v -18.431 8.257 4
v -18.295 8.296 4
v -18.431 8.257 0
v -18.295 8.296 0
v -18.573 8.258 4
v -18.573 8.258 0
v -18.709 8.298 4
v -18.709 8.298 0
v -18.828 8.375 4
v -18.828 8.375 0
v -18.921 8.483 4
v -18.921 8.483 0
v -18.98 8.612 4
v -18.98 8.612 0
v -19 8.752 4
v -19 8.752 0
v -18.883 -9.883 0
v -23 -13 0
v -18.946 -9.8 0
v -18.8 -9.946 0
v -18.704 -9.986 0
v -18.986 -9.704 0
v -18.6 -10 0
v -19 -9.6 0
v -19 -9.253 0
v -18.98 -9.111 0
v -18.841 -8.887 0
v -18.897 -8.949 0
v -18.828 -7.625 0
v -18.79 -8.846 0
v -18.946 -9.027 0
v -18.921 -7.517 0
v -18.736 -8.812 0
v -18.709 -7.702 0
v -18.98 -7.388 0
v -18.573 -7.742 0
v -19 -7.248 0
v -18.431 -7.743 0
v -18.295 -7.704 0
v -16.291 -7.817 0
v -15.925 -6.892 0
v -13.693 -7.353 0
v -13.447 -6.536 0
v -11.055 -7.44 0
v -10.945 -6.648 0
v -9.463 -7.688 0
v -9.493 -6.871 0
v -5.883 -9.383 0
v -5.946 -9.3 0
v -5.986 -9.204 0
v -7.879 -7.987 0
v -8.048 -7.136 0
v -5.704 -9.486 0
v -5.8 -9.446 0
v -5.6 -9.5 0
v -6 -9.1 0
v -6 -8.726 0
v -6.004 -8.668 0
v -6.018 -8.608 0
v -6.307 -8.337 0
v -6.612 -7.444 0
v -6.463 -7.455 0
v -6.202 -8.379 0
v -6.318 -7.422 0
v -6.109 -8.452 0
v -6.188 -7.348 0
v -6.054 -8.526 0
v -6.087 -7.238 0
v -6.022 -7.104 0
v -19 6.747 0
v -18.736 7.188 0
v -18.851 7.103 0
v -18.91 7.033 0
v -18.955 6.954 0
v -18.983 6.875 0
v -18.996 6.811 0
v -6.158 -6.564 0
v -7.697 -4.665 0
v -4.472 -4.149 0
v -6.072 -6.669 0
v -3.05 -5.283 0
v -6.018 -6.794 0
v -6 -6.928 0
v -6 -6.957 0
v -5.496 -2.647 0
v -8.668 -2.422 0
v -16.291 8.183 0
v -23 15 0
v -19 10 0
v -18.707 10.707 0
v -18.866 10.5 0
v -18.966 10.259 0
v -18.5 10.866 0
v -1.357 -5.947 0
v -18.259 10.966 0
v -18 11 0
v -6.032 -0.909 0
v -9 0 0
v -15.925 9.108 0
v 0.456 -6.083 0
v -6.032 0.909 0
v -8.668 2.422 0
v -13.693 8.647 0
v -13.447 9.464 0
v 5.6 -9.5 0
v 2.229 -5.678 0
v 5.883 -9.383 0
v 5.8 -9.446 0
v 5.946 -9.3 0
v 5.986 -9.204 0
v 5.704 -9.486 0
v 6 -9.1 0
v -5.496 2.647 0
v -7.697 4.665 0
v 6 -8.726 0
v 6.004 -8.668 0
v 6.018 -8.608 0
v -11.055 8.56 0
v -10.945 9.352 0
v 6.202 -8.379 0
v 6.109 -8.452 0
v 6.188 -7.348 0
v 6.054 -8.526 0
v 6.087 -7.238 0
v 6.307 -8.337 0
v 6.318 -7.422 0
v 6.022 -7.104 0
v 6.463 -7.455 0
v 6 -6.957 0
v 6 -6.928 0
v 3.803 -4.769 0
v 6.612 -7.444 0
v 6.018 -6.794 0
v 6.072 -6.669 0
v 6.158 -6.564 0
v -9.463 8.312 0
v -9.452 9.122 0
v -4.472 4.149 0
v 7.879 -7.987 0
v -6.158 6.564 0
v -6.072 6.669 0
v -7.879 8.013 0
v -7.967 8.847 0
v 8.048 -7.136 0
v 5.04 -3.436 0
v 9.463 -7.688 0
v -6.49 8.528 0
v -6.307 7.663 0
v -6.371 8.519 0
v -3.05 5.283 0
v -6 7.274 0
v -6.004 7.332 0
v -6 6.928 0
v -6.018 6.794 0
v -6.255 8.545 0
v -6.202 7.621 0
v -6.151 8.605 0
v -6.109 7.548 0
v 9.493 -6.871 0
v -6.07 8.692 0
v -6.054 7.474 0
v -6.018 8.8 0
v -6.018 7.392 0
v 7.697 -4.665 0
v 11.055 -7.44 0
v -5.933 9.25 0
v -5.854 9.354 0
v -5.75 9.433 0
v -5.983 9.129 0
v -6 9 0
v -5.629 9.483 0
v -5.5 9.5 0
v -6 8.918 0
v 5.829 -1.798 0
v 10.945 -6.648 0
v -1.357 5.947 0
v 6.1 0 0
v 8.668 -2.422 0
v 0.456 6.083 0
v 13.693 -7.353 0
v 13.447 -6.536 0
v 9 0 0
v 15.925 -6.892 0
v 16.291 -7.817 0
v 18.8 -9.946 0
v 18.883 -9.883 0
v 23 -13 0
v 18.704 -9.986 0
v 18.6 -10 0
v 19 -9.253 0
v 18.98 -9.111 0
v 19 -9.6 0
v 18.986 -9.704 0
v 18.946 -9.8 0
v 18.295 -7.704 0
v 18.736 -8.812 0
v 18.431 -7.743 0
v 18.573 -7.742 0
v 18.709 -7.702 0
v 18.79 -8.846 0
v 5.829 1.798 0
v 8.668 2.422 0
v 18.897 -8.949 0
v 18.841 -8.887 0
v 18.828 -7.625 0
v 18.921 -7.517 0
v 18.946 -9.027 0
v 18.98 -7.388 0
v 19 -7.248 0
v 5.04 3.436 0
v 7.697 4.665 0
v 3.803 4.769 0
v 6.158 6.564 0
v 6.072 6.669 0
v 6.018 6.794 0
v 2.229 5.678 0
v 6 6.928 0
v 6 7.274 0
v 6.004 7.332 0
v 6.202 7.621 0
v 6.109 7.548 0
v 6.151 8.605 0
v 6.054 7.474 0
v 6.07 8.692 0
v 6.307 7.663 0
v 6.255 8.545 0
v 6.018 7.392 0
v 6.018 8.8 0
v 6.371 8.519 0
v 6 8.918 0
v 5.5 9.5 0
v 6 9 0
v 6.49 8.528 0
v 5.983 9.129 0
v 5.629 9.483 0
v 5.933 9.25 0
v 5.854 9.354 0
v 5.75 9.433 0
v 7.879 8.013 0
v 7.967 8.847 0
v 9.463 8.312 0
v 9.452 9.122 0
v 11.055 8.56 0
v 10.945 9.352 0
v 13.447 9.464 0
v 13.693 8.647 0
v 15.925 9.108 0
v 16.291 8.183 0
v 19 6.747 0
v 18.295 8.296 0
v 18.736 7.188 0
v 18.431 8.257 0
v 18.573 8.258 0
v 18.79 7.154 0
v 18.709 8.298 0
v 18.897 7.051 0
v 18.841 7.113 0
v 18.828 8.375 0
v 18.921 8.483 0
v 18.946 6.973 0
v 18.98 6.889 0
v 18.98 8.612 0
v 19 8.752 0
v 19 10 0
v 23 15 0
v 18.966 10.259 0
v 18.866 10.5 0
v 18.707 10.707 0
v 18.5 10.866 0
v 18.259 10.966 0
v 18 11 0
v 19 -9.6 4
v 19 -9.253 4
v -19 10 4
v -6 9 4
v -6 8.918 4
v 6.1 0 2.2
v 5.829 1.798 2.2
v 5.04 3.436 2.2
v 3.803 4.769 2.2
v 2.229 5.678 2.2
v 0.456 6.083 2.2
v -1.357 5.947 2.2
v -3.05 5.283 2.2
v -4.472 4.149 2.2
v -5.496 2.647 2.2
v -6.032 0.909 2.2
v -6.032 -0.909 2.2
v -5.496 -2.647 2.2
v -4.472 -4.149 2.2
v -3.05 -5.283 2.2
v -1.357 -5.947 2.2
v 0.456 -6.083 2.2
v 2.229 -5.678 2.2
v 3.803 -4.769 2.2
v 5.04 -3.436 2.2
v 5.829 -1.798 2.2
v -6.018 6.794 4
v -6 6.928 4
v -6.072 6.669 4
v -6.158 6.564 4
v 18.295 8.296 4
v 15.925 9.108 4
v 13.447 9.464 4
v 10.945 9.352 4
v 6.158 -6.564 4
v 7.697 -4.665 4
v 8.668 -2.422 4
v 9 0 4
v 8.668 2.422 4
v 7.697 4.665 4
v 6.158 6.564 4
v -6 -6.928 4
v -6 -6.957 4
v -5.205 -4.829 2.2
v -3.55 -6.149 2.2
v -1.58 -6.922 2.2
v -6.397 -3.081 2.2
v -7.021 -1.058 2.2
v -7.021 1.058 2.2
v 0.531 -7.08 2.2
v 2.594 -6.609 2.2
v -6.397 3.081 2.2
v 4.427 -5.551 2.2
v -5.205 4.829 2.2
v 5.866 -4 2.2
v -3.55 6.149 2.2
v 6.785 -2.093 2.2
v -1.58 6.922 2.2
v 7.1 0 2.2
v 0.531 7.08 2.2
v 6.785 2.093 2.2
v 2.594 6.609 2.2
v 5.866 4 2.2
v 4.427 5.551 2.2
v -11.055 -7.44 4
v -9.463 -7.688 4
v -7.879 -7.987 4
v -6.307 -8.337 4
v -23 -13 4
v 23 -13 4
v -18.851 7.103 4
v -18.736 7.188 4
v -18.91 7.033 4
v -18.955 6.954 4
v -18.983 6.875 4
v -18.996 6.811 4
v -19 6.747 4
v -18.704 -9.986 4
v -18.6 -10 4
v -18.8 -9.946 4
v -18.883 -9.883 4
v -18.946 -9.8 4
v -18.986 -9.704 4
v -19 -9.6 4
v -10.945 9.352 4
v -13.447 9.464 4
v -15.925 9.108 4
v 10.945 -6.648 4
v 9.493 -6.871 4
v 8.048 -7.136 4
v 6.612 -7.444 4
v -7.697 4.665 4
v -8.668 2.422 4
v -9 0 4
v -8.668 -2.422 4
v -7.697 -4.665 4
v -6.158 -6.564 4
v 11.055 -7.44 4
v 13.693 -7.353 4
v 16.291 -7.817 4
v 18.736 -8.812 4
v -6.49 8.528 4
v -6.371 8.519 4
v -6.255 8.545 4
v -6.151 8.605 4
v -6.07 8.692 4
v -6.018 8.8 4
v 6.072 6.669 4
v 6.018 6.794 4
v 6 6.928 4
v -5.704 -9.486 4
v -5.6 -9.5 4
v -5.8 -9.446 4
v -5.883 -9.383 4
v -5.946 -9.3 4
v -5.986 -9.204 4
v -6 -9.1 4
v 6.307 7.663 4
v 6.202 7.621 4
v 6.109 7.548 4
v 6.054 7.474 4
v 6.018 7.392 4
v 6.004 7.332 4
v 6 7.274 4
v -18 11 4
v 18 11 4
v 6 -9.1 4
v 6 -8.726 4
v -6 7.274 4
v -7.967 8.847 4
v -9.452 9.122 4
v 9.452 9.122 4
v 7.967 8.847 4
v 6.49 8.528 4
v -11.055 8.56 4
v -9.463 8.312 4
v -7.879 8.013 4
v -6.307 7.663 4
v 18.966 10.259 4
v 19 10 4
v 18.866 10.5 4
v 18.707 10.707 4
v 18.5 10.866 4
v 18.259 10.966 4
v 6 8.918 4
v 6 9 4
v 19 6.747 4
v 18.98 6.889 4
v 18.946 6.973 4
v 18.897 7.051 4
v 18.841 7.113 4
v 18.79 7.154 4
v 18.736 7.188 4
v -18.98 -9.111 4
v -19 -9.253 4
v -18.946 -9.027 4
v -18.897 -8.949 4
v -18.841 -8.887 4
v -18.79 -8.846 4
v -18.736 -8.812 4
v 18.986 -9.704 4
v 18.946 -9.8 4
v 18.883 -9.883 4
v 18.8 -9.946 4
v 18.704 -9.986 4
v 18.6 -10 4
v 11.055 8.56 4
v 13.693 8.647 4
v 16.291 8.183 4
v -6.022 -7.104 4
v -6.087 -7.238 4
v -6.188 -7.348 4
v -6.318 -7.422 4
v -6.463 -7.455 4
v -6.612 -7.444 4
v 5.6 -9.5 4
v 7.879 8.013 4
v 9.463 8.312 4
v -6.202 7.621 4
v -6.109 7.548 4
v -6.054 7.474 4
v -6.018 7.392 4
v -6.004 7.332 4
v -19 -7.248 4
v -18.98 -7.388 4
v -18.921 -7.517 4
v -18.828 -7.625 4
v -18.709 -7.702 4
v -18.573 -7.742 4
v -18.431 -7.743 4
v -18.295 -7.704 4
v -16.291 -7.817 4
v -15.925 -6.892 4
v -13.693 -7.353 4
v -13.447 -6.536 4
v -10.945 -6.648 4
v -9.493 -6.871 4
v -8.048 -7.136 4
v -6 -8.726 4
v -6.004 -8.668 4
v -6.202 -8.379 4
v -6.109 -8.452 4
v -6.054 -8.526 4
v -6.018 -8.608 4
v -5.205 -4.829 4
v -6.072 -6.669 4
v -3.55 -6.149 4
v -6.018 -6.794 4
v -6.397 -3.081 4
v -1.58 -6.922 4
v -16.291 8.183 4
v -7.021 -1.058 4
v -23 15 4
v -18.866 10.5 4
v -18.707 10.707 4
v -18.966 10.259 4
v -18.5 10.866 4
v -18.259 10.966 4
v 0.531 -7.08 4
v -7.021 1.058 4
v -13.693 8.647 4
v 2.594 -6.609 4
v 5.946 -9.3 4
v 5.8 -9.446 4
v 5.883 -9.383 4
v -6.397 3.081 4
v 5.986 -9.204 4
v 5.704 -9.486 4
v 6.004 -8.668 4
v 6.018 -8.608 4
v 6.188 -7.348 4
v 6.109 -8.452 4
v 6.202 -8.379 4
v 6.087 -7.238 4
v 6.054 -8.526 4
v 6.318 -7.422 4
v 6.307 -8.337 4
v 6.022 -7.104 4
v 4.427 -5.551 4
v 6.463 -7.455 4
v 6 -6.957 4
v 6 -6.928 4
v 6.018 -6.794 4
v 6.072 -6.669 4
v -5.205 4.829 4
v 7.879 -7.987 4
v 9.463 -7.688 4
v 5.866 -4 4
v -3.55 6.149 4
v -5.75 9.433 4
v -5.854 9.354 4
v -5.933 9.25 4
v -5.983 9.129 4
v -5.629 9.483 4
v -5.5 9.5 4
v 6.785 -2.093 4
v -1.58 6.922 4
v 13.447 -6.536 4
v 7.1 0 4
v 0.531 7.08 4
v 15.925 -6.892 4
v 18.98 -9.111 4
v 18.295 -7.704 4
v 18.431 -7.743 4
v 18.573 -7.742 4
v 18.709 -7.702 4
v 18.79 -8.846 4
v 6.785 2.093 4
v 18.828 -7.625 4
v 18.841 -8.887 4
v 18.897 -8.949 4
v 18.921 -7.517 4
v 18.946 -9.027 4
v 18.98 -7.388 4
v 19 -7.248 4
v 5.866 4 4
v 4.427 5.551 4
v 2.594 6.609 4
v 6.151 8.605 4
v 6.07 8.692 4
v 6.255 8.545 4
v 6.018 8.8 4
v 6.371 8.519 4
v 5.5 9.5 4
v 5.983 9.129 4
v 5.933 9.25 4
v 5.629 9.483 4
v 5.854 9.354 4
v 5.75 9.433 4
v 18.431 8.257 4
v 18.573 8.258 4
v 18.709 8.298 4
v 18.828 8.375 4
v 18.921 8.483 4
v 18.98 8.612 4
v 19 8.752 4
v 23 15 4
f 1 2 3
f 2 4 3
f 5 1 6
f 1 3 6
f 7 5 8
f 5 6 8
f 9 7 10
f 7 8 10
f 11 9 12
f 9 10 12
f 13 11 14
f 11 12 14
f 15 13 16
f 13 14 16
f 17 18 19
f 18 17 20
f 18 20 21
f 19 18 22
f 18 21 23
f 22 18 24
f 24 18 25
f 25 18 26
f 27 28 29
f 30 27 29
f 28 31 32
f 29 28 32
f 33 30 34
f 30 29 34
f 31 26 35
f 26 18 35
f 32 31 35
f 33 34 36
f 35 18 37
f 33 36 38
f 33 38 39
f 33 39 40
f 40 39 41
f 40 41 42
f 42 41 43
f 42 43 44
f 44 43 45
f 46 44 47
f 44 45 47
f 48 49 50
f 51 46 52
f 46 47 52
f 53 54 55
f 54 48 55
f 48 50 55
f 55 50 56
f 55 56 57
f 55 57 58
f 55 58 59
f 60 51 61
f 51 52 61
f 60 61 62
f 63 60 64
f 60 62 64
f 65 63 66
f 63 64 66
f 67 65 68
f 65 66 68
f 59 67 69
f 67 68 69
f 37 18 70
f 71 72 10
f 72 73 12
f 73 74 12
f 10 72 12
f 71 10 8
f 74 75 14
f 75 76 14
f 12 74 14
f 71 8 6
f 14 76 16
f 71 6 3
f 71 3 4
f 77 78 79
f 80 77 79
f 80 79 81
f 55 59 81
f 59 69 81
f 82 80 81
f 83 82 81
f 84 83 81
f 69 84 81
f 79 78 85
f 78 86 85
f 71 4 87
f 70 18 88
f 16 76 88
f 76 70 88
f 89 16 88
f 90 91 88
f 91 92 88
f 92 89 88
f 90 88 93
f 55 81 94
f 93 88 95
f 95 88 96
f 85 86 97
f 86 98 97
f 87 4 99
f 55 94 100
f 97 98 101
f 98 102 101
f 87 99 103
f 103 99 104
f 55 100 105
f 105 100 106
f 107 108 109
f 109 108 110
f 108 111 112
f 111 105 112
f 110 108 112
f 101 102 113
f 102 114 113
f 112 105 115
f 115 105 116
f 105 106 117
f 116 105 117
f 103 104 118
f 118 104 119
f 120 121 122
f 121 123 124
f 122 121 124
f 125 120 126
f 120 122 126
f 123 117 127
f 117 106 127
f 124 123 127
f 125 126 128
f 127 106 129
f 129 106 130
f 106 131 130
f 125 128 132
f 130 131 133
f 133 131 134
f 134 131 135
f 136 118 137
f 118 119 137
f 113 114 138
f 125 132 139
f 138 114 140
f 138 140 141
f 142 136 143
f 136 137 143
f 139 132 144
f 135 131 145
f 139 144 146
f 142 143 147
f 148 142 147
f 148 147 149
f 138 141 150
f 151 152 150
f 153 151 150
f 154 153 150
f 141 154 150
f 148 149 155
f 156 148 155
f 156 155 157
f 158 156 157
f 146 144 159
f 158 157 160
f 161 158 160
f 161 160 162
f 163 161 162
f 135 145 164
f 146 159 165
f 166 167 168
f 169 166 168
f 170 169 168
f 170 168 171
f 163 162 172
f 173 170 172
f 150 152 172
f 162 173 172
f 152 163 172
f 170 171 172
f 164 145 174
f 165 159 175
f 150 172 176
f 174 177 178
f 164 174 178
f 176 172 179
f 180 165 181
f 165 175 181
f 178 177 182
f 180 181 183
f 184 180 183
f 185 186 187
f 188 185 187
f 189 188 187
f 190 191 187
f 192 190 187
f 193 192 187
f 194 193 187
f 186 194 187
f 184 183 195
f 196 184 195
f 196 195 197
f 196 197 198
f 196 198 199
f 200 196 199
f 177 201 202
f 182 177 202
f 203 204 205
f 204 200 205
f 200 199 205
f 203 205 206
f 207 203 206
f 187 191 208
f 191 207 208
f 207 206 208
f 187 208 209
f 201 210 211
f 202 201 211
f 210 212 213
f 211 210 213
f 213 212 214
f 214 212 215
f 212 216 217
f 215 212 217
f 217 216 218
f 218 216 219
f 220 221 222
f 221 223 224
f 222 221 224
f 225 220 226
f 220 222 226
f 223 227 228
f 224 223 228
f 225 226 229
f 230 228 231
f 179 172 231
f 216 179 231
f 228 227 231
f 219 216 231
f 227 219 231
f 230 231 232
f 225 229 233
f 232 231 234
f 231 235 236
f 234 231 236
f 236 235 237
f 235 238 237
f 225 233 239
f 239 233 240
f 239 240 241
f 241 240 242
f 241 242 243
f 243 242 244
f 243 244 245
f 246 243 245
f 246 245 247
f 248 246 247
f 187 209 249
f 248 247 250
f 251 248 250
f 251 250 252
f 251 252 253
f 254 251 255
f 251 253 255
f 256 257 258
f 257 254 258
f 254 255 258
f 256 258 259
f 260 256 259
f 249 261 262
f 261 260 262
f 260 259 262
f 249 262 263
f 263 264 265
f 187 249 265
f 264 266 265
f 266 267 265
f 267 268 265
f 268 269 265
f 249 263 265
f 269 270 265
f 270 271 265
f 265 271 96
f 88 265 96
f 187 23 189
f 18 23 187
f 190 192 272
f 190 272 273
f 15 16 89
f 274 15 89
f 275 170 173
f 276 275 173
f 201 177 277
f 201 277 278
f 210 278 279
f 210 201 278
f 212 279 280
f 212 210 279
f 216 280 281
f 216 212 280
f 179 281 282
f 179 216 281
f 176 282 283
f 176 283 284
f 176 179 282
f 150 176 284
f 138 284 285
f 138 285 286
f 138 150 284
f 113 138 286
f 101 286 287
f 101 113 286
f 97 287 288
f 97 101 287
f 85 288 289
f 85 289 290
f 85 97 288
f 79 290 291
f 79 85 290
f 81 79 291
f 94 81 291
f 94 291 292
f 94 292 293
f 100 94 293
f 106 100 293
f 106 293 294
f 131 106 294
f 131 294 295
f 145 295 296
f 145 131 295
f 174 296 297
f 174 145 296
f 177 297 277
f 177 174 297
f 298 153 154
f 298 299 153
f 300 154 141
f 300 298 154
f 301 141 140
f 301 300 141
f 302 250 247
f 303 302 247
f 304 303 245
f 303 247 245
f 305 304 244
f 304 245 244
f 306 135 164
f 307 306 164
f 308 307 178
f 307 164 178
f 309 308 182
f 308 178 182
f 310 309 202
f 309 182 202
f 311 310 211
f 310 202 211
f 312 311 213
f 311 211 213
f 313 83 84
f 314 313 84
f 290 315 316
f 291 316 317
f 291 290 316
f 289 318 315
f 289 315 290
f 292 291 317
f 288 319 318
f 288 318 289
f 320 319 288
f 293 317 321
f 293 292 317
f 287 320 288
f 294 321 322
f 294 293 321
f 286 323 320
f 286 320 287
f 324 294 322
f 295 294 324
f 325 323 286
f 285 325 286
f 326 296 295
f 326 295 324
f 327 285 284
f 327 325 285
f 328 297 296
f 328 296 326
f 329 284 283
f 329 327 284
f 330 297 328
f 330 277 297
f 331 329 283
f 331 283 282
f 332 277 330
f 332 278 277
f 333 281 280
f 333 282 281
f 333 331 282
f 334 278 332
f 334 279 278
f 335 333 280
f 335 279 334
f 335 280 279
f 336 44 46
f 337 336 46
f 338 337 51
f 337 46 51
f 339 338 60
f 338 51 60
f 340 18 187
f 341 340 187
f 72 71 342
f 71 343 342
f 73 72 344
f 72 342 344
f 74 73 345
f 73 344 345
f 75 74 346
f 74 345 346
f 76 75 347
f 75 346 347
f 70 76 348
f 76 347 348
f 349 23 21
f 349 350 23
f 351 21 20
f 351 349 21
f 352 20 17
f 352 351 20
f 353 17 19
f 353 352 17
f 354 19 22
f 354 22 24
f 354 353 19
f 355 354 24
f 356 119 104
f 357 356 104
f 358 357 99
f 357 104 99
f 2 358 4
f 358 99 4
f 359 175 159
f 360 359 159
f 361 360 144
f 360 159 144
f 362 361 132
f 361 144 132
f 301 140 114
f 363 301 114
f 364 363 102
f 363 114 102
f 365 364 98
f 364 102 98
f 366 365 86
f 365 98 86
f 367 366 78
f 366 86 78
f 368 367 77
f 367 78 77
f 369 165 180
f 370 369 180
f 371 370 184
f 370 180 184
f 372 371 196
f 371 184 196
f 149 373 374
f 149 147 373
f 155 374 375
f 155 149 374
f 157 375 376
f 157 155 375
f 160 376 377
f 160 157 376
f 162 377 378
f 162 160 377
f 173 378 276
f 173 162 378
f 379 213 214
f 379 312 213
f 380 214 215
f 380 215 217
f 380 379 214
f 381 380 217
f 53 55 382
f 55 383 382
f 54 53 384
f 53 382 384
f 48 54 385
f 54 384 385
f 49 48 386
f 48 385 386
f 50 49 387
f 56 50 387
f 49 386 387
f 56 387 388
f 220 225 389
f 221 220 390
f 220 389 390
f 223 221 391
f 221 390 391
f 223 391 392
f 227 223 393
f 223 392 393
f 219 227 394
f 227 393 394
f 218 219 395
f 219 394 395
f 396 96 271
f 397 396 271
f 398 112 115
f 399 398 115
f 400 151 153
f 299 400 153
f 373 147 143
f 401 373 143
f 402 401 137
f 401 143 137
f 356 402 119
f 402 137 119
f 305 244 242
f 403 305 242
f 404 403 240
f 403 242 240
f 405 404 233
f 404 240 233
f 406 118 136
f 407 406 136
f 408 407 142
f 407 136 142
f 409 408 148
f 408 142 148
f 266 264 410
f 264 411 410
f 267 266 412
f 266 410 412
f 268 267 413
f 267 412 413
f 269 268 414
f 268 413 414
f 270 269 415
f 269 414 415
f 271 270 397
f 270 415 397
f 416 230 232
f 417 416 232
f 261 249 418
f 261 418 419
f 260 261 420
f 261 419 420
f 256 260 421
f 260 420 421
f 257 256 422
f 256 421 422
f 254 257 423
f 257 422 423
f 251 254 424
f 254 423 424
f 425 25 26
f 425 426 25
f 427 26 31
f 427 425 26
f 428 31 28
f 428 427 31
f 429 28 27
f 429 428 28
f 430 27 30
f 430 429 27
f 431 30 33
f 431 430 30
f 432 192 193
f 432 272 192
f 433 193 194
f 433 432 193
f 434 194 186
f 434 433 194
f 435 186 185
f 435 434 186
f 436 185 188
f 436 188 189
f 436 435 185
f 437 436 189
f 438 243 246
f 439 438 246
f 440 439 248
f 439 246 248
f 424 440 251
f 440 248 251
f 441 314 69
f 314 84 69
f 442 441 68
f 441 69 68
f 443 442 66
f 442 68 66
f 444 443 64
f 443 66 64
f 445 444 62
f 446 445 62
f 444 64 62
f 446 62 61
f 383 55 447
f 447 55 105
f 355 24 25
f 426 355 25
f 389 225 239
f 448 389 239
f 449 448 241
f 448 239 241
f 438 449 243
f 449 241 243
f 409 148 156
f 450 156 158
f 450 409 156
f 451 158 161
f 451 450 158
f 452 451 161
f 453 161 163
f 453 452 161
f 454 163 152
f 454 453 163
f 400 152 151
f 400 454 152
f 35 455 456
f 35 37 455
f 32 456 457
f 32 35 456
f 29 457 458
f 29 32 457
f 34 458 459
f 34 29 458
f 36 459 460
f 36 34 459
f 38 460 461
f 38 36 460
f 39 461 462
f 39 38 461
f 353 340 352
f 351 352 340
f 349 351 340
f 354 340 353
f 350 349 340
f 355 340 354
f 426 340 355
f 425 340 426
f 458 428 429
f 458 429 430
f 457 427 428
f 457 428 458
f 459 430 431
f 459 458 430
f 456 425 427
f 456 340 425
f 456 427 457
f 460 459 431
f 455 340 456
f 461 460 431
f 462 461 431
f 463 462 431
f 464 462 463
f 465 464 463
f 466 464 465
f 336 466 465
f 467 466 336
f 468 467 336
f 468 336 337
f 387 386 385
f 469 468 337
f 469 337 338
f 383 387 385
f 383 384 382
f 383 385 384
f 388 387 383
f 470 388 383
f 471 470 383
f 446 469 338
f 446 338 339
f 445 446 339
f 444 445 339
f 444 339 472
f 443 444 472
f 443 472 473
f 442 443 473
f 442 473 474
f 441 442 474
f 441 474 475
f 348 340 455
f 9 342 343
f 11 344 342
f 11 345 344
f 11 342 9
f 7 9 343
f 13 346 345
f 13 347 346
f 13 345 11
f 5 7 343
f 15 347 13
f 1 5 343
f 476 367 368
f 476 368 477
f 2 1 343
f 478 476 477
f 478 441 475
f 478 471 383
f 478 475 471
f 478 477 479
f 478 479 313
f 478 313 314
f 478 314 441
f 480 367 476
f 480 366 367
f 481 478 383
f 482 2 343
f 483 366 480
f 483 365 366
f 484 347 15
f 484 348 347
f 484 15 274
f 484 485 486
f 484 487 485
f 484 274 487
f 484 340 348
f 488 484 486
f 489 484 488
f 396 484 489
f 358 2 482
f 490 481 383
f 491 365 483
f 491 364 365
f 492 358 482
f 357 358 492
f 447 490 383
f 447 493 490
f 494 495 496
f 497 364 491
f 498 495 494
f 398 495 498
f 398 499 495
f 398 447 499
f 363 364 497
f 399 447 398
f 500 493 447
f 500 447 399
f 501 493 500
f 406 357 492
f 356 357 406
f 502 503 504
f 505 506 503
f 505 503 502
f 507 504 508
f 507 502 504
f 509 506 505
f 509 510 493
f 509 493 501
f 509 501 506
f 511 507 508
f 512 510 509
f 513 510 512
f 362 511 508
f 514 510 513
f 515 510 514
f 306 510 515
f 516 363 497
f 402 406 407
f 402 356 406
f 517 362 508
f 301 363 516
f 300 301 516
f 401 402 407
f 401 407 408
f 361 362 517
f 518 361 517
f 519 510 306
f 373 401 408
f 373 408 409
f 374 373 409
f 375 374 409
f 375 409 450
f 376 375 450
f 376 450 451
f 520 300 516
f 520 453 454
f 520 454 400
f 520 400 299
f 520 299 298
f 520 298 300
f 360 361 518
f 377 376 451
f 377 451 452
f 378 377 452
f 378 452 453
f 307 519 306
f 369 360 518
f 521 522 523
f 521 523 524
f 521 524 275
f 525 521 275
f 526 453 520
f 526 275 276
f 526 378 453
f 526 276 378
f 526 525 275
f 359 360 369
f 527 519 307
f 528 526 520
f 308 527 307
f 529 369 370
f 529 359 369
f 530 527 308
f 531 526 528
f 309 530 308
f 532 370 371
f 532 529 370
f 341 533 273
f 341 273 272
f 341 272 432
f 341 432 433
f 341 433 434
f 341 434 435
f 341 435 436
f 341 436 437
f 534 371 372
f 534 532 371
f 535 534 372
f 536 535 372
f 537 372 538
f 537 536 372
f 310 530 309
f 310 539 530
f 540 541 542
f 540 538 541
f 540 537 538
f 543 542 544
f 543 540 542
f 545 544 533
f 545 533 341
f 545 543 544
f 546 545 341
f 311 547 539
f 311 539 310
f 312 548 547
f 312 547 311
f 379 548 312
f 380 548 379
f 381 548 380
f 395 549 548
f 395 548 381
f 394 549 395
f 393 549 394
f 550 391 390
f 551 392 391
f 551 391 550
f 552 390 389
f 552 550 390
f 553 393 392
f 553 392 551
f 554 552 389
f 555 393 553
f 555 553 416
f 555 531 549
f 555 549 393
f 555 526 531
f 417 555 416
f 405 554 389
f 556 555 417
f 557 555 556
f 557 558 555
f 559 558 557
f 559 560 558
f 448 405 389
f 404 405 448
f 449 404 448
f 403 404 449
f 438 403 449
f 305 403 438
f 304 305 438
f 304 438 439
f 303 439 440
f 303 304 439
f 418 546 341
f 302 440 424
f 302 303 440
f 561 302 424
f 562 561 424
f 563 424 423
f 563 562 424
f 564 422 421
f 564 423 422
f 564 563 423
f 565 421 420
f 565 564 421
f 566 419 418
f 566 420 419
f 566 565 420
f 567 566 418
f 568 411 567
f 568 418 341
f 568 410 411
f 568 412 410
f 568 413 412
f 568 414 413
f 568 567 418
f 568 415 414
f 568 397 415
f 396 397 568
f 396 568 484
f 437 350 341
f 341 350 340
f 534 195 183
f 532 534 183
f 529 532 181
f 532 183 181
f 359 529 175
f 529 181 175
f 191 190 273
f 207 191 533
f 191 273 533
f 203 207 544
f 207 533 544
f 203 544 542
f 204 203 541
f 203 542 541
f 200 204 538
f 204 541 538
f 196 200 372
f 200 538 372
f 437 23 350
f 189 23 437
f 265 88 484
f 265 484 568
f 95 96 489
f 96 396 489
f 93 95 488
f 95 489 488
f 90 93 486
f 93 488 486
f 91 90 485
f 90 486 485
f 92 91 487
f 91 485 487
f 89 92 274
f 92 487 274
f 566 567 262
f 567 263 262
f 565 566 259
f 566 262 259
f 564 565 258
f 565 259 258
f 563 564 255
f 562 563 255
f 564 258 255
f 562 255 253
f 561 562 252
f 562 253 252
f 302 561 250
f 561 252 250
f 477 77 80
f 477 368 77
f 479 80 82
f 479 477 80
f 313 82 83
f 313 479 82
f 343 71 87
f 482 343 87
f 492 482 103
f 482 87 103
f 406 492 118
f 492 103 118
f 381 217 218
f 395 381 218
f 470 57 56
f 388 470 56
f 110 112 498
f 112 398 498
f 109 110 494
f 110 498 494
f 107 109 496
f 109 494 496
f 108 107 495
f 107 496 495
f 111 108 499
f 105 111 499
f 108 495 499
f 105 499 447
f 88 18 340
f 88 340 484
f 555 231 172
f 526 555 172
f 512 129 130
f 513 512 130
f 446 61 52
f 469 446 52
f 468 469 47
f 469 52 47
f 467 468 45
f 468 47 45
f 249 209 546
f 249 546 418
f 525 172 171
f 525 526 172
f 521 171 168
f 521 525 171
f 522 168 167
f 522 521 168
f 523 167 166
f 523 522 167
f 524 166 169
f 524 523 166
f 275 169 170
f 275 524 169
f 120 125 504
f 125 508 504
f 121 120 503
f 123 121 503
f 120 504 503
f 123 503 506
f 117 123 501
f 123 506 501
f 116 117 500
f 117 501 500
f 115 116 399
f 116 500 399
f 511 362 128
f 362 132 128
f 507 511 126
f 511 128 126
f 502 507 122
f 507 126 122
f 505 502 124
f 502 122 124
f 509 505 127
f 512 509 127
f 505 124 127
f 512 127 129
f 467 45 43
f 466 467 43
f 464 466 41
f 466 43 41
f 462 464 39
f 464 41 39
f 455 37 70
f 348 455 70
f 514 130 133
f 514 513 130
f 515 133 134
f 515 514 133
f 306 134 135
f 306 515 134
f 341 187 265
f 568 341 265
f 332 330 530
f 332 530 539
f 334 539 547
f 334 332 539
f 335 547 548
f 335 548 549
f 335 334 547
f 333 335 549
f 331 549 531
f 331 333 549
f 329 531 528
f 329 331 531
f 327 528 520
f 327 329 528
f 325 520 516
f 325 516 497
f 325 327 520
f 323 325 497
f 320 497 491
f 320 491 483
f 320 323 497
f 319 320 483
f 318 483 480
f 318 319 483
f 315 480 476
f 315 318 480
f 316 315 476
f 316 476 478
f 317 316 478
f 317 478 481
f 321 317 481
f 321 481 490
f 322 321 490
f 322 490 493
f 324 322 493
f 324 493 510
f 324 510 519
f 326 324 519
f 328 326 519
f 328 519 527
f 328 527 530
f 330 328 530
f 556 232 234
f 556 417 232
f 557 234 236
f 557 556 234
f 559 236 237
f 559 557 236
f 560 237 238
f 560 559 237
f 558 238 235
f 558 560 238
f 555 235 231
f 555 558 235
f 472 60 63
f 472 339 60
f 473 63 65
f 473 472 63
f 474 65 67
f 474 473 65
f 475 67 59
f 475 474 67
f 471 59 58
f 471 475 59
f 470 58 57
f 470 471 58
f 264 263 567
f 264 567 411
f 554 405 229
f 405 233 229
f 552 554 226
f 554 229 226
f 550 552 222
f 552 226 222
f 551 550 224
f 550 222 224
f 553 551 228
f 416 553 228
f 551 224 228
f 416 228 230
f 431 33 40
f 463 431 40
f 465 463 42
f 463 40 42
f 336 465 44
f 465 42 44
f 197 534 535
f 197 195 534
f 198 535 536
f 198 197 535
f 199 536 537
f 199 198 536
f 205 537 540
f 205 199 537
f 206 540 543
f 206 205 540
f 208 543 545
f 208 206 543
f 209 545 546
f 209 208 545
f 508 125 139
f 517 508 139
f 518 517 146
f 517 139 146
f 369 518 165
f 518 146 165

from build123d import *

# Parameters (mm, degrees)
SKETCH_2_R          = 7.1
SKETCH_2_R_2        = 6.1
EXTRUDE_1_DEPTH     = 2.2
SKETCH_2_3_R        = 9
SKETCH_2_3_R_2      = 7.1
EXTRUDE_2_DEPTH     = 4
EXTRUDE_3_DEPTH     = 4
SKETCH_4_W          = 46
SKETCH_4_H          = 28
SKETCH_4_W_2        = 38
SKETCH_4_H_2        = 21
EXTRUDE_4_DEPTH     = 4
EXTRUDE_1_2_DEPTH   = 4
DELETE_FACE_1_DEPTH = 4
FILLET_4_R          = 0.5
FILLET_5_R          = 0.4
FILLET_6_R          = 1


# Read off the part's stored shape, not the designer's step: 删除面1
with BuildPart() as part:
    # 草图2 → Extrude 1 (new body)
    with BuildSketch(Plane.XY):
        Circle(SKETCH_2_R)
        Circle(SKETCH_2_R_2, mode=Mode.SUBTRACT)
    extrude(amount=EXTRUDE_1_DEPTH)

    # 草图2<3> → 凸台-拉伸2 (add)
    with BuildSketch(Plane.XY):
        Circle(SKETCH_2_3_R)
        Circle(SKETCH_2_3_R_2, mode=Mode.SUBTRACT)
    extrude(amount=EXTRUDE_2_DEPTH)

    # 草图3 → 凸台-拉伸3 (add)
    with BuildSketch(Plane.XY):
        with BuildLine():
            Line((6, 6.708203932), (6, 9.5))
            Line((6, 9.5), (-6, 9.5))
            Line((-6, 9.5), (-6, 6.708203932))
            ThreePointArc((-6, 6.708203932), (0, 9), (6, 6.708203932))
        make_face()
        with BuildLine():
            Line((-6, -9.5), (6, -9.5))
            Line((6, -9.5), (6, -6.708203932))
            ThreePointArc((6, -6.708203932), (0, -9), (-6, -6.708203932))
            Line((-6, -6.708203932), (-6, -9.5))
        make_face()
    extrude(amount=EXTRUDE_3_DEPTH)



with BuildPart() as body_2:
    # 草图4 → 凸台-拉伸4 (new body)
    with BuildSketch(Plane.XY):
        with Locations((0, 1)):
            Rectangle(SKETCH_4_W, SKETCH_4_H)
        with Locations((0, 0.5)):
            Rectangle(SKETCH_4_W_2, SKETCH_4_H_2, mode=Mode.SUBTRACT)
    extrude(amount=EXTRUDE_4_DEPTH)


with BuildPart() as part_1:
    add(part.part)

    add(body_2.part)  # Extrude 1 2 merges body 2
    # 草图7 → Extrude 1 2 (add)
    with BuildSketch(Plane.XY):
        with BuildLine():
            ThreePointArc((19.19111663, -8.148610709), (15.188418529, -6.736776188), (10.944962783, -6.647601418))
            ThreePointArc((10.944962783, -6.647601418), (8.412688328, -7.06534444), (5.904962783, -7.611454086))
            Line((5.904962783, -7.611454086), (6.095037217, -8.388545914))
            ThreePointArc((6.095037217, -8.388545914), (8.562957594, -7.851104675), (11.055037217, -7.439992495))
            ThreePointArc((11.055037217, -7.439992495), (15.04515232, -7.523843398), (18.80888337, -8.851389291))
            Line((18.80888337, -8.851389291), (19.19111663, -8.148610709))
        make_face()
        with BuildLine():
            ThreePointArc((-18.80888337, -8.851389291), (-15.04515232, -7.523843398), (-11.055037217, -7.439992495))
            ThreePointArc((-11.055037217, -7.439992495), (-8.562957594, -7.851104675), (-6.095037217, -8.388545914))
            Line((-6.095037217, -8.388545914), (-5.904962783, -7.611454086))
            ThreePointArc((-5.904962783, -7.611454086), (-8.412688328, -7.06534444), (-10.944962783, -6.647601418))
            ThreePointArc((-10.944962783, -6.647601418), (-15.188418529, -6.736776188), (-19.19111663, -8.148610709))
            Line((-19.19111663, -8.148610709), (-18.80888337, -8.851389291))
        make_face()
        with BuildLine():
            ThreePointArc((-18.80888337, 7.148610709), (-15.04515232, 8.476156602), (-11.055037217, 8.560007505))
            ThreePointArc((-11.055037217, 8.560007505), (-8.562957594, 8.148895325), (-6.095037217, 7.611454086))
            Line((-6.095037217, 7.611454086), (-5.904962783, 8.388545914))
            ThreePointArc((-5.904962783, 8.388545914), (-8.412688328, 8.93465556), (-10.944962783, 9.352398582))
            ThreePointArc((-10.944962783, 9.352398582), (-15.188418529, 9.263223812), (-19.19111663, 7.851389291))
            Line((-19.19111663, 7.851389291), (-18.80888337, 7.148610709))
        make_face()
        with BuildLine():
            ThreePointArc((19.19111663, 7.851389291), (15.188418529, 9.263223812), (10.944962783, 9.352398582))
            ThreePointArc((10.944962783, 9.352398582), (8.412688328, 8.93465556), (5.904962783, 8.388545914))
            Line((5.904962783, 8.388545914), (6.095037217, 7.611454086))
            ThreePointArc((6.095037217, 7.611454086), (8.562957594, 8.148895325), (11.055037217, 8.560007505))
            ThreePointArc((11.055037217, 8.560007505), (15.04515232, 8.476156602), (18.80888337, 7.148610709))
            Line((18.80888337, 7.148610709), (19.19111663, 7.851389291))
        make_face()
    extrude(amount=EXTRUDE_1_2_DEPTH)

    # Delete Face 1 outline → Delete Face 1 (add)
    with BuildSketch(Plane.XY):
        with BuildLine():
            ThreePointArc((-19, 7.042506057), (-18.904671788, 7.095972847), (-18.80888337, 7.148610709))
            Line((-18.80888337, 7.148610709), (-19, 7.5))
            Line((-19, 7.5), (-19, 7.042506057))
        make_face()
        with BuildLine():
            Line((-6, 7.588108866), (-6, 8))
            Line((-6, 8), (-6.095037217, 7.611454086))
            ThreePointArc((-6.095037217, 7.611454086), (-6.047512851, 7.599804915), (-6, 7.588108866))
        make_face()
        with BuildLine():
            ThreePointArc((-19, -8.957493943), (-18.904671788, -8.904027153), (-18.80888337, -8.851389291))
            Line((-18.80888337, -8.851389291), (-19, -8.5))
            Line((-19, -8.5), (-19, -8.957493943))
        make_face()
        with BuildLine():
            Line((-6, -8.411891134), (-6, -8))
            Line((-6, -8), (-6.095037217, -8.388545914))
            ThreePointArc((-6.095037217, -8.388545914), (-6.047512851, -8.400195085), (-6, -8.411891134))
        make_face()
        with BuildLine():
            Line((6.095037217, 7.611454086), (6, 8))
            Line((6, 8), (6, 7.588108866))
            ThreePointArc((6, 7.588108866), (6.047512851, 7.599804915), (6.095037217, 7.611454086))
        make_face()
        with BuildLine():
            Line((19, 7.5), (18.80888337, 7.148610709))
            ThreePointArc((18.80888337, 7.148610709), (18.904671788, 7.095972847), (19, 7.042506057))
            Line((19, 7.042506057), (19, 7.5))
        make_face()
        with BuildLine():
            Line((6.095037217, -8.388545914), (6, -8))
            Line((6, -8), (6, -8.411891134))
            ThreePointArc((6, -8.411891134), (6.047512851, -8.400195085), (6.095037217, -8.388545914))
        make_face()
        with BuildLine():
            Line((19, -8.5), (18.80888337, -8.851389291))
            ThreePointArc((18.80888337, -8.851389291), (18.904671788, -8.904027153), (19, -8.957493943))
            Line((19, -8.957493943), (19, -8.5))
        make_face()
    extrude(amount=DELETE_FACE_1_DEPTH)

    # 圆角4
    fillet_4_edges = [part_1.edges().sort_by_distance(p)[0] for p in [
        (19, -8.046657496, 2),
        (6, -7.588305973, 2),
        (-19, -8.046657496, 2),
        (-6, -7.588305973, 2),
        (-6, 9.5, 2),
        (6, 9.5, 2),
        (6, 6.708203932, 2),
        (-6, 6.708203932, 2),
        (19, -8.957493943, 2),
        (-19, -8.957493943, 2),
        (-19, 7.042506057, 2),
        (19, 7.042506057, 2),
        (6, -6.708203932, 2),
        (-6, -6.708203932, 2),
        (-19, 7.953342504, 2),
        (19, 7.953342504, 2),
    ]]
    fillet(fillet_4_edges, radius=FILLET_4_R)

    # 圆角5
    fillet_5_edges = [part_1.edges().sort_by_distance(p)[0] for p in [
        (6, -8.411891134, 2),
        (-6, -8.411891134, 2),
        (-6, 7.588108866, 2),
        (6, 7.588108866, 2),
        (-6, -9.5, 2),
        (6, -9.5, 2),
        (-6, 8.411694027, 2),
        (-19, -10, 2),
        (19, -10, 2),
        (6, 8.411694027, 2),
    ]]
    fillet(fillet_5_edges, radius=FILLET_5_R)

    # 圆角6
    fillet_6_edges = [part_1.edges().sort_by_distance(p)[0] for p in [
        (19, 11, 2),
        (-19, 11, 2),
    ]]
    fillet(fillet_6_edges, radius=FILLET_6_R)


solid = part_1.part
